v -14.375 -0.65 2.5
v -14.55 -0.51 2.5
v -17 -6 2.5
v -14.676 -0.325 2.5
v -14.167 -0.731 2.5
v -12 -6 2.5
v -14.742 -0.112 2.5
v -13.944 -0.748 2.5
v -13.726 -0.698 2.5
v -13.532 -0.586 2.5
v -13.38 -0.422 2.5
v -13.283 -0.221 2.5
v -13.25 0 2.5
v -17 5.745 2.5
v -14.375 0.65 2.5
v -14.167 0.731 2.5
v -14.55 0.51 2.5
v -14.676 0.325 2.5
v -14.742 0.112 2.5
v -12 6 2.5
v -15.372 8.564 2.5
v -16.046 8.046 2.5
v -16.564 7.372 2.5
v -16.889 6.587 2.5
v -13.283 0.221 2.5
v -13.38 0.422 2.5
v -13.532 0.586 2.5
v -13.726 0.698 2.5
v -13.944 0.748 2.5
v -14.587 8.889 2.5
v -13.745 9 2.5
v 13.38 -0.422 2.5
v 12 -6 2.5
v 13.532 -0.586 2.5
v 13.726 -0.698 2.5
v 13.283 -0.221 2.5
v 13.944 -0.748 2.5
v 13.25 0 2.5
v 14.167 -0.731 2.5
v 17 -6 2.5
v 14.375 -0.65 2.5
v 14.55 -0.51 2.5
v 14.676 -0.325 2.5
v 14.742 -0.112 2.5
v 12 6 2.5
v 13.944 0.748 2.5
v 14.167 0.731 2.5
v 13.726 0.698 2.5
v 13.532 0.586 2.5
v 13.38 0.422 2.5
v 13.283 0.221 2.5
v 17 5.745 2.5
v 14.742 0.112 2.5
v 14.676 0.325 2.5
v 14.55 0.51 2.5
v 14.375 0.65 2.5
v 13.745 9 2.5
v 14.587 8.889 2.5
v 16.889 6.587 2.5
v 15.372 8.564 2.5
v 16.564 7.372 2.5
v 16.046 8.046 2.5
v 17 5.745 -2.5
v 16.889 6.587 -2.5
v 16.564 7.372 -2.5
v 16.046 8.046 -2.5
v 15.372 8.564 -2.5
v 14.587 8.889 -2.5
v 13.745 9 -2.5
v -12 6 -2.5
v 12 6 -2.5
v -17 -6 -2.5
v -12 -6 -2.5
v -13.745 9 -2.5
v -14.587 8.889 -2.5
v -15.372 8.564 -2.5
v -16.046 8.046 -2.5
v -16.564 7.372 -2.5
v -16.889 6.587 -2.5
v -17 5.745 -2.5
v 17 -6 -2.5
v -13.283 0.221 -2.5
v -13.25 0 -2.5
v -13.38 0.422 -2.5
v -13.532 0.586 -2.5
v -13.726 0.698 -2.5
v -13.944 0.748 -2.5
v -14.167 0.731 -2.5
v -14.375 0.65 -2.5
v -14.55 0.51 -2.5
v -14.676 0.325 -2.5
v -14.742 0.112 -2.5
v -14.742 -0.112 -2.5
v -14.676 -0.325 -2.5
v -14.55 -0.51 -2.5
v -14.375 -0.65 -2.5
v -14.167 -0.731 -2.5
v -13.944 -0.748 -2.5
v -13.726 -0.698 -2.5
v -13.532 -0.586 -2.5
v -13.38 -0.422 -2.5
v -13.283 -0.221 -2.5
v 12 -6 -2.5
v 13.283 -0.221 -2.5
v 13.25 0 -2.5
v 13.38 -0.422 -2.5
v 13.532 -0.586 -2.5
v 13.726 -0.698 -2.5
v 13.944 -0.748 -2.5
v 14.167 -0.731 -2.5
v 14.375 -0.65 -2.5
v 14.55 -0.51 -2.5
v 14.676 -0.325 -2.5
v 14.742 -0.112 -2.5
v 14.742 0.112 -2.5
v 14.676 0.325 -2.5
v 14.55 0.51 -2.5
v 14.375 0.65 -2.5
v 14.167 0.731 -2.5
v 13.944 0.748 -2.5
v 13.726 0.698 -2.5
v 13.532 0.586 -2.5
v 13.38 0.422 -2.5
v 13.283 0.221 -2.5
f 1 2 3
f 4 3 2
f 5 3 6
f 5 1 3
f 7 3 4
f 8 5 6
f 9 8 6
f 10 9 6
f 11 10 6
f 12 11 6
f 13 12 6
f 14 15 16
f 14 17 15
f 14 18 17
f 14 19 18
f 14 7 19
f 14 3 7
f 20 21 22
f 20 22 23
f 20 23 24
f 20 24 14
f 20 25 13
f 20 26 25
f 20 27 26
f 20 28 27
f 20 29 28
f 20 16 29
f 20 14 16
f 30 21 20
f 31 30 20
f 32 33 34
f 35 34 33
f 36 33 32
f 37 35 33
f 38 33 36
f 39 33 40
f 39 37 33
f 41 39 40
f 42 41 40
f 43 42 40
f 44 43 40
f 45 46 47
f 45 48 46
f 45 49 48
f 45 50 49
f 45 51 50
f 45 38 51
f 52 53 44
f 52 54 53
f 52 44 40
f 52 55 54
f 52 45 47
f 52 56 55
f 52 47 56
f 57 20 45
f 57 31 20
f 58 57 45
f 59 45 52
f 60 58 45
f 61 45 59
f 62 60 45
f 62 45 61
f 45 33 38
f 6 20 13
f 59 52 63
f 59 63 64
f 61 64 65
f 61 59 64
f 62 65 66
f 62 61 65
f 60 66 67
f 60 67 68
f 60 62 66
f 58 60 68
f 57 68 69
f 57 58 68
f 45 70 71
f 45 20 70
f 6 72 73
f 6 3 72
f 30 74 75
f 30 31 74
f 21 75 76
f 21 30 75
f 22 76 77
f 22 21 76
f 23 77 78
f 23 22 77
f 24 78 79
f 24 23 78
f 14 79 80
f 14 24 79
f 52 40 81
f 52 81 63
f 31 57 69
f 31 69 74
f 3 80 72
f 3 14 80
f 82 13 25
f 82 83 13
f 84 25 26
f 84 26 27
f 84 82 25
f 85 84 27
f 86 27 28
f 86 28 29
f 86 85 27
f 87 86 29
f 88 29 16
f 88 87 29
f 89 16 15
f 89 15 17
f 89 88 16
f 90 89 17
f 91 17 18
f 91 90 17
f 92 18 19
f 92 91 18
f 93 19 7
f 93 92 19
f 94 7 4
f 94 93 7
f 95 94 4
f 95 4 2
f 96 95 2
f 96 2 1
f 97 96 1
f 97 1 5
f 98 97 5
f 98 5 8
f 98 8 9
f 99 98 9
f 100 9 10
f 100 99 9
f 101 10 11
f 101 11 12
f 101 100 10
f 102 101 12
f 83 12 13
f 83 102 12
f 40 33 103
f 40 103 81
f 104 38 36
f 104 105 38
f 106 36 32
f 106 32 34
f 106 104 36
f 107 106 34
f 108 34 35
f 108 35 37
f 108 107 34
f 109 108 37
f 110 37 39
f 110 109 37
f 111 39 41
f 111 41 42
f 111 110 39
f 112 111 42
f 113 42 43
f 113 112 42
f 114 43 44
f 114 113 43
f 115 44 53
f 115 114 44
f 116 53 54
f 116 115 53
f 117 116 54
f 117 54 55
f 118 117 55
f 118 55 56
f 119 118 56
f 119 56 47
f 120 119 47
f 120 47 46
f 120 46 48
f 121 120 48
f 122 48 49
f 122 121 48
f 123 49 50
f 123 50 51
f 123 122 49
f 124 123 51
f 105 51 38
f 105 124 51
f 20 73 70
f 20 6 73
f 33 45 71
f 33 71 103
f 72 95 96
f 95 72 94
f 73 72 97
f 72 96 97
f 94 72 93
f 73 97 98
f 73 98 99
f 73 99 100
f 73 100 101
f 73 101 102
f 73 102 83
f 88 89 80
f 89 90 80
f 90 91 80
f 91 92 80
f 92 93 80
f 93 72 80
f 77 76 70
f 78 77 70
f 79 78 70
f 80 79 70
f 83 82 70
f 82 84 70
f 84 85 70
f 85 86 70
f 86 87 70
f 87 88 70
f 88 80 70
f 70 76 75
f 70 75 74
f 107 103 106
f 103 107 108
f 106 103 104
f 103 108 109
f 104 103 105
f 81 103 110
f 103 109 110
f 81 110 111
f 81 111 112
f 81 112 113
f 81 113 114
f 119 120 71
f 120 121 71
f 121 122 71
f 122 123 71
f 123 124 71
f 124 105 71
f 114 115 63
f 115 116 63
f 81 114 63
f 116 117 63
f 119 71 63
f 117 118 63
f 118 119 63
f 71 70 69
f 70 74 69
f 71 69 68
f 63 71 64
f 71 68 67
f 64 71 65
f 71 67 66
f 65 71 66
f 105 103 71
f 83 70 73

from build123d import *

# Parameters (mm, degrees)
CROQUIS1_R              = 0.75
SALIENTE_EXTRUIR1_DEPTH = 2.5


with BuildPart() as part:
    # Croquis1 → Saliente-Extruir1 (new, symmetric)
    with BuildSketch(Plane.XY):
        with BuildLine():
            Line((-12, 6), (12, 6))
            Line((12, 6), (12, -6))
            Line((12, -6), (17, -6))
            Line((17, -6), (17, 5.74451768))
            ThreePointArc((17, 5.74451768), (16.046491304, 8.046491304), (13.74451768, 9))
            Line((13.74451768, 9), (-13.74451768, 9))
            ThreePointArc((-13.74451768, 9), (-16.046491304, 8.046491304), (-17, 5.74451768))
            Line((-17, 5.74451768), (-17, -6))
            Line((-17, -6), (-12, -6))
            Line((-12, -6), (-12, 6))
        make_face()
        with Locations((-14, 0)):
            Circle(CROQUIS1_R, mode=Mode.SUBTRACT)
        with Locations(Location((14, 0, 0), (0, 0, 180))):
            Circle(CROQUIS1_R, mode=Mode.SUBTRACT)
    extrude(amount=SALIENTE_EXTRUIR1_DEPTH, both=True)


solid = part.part
